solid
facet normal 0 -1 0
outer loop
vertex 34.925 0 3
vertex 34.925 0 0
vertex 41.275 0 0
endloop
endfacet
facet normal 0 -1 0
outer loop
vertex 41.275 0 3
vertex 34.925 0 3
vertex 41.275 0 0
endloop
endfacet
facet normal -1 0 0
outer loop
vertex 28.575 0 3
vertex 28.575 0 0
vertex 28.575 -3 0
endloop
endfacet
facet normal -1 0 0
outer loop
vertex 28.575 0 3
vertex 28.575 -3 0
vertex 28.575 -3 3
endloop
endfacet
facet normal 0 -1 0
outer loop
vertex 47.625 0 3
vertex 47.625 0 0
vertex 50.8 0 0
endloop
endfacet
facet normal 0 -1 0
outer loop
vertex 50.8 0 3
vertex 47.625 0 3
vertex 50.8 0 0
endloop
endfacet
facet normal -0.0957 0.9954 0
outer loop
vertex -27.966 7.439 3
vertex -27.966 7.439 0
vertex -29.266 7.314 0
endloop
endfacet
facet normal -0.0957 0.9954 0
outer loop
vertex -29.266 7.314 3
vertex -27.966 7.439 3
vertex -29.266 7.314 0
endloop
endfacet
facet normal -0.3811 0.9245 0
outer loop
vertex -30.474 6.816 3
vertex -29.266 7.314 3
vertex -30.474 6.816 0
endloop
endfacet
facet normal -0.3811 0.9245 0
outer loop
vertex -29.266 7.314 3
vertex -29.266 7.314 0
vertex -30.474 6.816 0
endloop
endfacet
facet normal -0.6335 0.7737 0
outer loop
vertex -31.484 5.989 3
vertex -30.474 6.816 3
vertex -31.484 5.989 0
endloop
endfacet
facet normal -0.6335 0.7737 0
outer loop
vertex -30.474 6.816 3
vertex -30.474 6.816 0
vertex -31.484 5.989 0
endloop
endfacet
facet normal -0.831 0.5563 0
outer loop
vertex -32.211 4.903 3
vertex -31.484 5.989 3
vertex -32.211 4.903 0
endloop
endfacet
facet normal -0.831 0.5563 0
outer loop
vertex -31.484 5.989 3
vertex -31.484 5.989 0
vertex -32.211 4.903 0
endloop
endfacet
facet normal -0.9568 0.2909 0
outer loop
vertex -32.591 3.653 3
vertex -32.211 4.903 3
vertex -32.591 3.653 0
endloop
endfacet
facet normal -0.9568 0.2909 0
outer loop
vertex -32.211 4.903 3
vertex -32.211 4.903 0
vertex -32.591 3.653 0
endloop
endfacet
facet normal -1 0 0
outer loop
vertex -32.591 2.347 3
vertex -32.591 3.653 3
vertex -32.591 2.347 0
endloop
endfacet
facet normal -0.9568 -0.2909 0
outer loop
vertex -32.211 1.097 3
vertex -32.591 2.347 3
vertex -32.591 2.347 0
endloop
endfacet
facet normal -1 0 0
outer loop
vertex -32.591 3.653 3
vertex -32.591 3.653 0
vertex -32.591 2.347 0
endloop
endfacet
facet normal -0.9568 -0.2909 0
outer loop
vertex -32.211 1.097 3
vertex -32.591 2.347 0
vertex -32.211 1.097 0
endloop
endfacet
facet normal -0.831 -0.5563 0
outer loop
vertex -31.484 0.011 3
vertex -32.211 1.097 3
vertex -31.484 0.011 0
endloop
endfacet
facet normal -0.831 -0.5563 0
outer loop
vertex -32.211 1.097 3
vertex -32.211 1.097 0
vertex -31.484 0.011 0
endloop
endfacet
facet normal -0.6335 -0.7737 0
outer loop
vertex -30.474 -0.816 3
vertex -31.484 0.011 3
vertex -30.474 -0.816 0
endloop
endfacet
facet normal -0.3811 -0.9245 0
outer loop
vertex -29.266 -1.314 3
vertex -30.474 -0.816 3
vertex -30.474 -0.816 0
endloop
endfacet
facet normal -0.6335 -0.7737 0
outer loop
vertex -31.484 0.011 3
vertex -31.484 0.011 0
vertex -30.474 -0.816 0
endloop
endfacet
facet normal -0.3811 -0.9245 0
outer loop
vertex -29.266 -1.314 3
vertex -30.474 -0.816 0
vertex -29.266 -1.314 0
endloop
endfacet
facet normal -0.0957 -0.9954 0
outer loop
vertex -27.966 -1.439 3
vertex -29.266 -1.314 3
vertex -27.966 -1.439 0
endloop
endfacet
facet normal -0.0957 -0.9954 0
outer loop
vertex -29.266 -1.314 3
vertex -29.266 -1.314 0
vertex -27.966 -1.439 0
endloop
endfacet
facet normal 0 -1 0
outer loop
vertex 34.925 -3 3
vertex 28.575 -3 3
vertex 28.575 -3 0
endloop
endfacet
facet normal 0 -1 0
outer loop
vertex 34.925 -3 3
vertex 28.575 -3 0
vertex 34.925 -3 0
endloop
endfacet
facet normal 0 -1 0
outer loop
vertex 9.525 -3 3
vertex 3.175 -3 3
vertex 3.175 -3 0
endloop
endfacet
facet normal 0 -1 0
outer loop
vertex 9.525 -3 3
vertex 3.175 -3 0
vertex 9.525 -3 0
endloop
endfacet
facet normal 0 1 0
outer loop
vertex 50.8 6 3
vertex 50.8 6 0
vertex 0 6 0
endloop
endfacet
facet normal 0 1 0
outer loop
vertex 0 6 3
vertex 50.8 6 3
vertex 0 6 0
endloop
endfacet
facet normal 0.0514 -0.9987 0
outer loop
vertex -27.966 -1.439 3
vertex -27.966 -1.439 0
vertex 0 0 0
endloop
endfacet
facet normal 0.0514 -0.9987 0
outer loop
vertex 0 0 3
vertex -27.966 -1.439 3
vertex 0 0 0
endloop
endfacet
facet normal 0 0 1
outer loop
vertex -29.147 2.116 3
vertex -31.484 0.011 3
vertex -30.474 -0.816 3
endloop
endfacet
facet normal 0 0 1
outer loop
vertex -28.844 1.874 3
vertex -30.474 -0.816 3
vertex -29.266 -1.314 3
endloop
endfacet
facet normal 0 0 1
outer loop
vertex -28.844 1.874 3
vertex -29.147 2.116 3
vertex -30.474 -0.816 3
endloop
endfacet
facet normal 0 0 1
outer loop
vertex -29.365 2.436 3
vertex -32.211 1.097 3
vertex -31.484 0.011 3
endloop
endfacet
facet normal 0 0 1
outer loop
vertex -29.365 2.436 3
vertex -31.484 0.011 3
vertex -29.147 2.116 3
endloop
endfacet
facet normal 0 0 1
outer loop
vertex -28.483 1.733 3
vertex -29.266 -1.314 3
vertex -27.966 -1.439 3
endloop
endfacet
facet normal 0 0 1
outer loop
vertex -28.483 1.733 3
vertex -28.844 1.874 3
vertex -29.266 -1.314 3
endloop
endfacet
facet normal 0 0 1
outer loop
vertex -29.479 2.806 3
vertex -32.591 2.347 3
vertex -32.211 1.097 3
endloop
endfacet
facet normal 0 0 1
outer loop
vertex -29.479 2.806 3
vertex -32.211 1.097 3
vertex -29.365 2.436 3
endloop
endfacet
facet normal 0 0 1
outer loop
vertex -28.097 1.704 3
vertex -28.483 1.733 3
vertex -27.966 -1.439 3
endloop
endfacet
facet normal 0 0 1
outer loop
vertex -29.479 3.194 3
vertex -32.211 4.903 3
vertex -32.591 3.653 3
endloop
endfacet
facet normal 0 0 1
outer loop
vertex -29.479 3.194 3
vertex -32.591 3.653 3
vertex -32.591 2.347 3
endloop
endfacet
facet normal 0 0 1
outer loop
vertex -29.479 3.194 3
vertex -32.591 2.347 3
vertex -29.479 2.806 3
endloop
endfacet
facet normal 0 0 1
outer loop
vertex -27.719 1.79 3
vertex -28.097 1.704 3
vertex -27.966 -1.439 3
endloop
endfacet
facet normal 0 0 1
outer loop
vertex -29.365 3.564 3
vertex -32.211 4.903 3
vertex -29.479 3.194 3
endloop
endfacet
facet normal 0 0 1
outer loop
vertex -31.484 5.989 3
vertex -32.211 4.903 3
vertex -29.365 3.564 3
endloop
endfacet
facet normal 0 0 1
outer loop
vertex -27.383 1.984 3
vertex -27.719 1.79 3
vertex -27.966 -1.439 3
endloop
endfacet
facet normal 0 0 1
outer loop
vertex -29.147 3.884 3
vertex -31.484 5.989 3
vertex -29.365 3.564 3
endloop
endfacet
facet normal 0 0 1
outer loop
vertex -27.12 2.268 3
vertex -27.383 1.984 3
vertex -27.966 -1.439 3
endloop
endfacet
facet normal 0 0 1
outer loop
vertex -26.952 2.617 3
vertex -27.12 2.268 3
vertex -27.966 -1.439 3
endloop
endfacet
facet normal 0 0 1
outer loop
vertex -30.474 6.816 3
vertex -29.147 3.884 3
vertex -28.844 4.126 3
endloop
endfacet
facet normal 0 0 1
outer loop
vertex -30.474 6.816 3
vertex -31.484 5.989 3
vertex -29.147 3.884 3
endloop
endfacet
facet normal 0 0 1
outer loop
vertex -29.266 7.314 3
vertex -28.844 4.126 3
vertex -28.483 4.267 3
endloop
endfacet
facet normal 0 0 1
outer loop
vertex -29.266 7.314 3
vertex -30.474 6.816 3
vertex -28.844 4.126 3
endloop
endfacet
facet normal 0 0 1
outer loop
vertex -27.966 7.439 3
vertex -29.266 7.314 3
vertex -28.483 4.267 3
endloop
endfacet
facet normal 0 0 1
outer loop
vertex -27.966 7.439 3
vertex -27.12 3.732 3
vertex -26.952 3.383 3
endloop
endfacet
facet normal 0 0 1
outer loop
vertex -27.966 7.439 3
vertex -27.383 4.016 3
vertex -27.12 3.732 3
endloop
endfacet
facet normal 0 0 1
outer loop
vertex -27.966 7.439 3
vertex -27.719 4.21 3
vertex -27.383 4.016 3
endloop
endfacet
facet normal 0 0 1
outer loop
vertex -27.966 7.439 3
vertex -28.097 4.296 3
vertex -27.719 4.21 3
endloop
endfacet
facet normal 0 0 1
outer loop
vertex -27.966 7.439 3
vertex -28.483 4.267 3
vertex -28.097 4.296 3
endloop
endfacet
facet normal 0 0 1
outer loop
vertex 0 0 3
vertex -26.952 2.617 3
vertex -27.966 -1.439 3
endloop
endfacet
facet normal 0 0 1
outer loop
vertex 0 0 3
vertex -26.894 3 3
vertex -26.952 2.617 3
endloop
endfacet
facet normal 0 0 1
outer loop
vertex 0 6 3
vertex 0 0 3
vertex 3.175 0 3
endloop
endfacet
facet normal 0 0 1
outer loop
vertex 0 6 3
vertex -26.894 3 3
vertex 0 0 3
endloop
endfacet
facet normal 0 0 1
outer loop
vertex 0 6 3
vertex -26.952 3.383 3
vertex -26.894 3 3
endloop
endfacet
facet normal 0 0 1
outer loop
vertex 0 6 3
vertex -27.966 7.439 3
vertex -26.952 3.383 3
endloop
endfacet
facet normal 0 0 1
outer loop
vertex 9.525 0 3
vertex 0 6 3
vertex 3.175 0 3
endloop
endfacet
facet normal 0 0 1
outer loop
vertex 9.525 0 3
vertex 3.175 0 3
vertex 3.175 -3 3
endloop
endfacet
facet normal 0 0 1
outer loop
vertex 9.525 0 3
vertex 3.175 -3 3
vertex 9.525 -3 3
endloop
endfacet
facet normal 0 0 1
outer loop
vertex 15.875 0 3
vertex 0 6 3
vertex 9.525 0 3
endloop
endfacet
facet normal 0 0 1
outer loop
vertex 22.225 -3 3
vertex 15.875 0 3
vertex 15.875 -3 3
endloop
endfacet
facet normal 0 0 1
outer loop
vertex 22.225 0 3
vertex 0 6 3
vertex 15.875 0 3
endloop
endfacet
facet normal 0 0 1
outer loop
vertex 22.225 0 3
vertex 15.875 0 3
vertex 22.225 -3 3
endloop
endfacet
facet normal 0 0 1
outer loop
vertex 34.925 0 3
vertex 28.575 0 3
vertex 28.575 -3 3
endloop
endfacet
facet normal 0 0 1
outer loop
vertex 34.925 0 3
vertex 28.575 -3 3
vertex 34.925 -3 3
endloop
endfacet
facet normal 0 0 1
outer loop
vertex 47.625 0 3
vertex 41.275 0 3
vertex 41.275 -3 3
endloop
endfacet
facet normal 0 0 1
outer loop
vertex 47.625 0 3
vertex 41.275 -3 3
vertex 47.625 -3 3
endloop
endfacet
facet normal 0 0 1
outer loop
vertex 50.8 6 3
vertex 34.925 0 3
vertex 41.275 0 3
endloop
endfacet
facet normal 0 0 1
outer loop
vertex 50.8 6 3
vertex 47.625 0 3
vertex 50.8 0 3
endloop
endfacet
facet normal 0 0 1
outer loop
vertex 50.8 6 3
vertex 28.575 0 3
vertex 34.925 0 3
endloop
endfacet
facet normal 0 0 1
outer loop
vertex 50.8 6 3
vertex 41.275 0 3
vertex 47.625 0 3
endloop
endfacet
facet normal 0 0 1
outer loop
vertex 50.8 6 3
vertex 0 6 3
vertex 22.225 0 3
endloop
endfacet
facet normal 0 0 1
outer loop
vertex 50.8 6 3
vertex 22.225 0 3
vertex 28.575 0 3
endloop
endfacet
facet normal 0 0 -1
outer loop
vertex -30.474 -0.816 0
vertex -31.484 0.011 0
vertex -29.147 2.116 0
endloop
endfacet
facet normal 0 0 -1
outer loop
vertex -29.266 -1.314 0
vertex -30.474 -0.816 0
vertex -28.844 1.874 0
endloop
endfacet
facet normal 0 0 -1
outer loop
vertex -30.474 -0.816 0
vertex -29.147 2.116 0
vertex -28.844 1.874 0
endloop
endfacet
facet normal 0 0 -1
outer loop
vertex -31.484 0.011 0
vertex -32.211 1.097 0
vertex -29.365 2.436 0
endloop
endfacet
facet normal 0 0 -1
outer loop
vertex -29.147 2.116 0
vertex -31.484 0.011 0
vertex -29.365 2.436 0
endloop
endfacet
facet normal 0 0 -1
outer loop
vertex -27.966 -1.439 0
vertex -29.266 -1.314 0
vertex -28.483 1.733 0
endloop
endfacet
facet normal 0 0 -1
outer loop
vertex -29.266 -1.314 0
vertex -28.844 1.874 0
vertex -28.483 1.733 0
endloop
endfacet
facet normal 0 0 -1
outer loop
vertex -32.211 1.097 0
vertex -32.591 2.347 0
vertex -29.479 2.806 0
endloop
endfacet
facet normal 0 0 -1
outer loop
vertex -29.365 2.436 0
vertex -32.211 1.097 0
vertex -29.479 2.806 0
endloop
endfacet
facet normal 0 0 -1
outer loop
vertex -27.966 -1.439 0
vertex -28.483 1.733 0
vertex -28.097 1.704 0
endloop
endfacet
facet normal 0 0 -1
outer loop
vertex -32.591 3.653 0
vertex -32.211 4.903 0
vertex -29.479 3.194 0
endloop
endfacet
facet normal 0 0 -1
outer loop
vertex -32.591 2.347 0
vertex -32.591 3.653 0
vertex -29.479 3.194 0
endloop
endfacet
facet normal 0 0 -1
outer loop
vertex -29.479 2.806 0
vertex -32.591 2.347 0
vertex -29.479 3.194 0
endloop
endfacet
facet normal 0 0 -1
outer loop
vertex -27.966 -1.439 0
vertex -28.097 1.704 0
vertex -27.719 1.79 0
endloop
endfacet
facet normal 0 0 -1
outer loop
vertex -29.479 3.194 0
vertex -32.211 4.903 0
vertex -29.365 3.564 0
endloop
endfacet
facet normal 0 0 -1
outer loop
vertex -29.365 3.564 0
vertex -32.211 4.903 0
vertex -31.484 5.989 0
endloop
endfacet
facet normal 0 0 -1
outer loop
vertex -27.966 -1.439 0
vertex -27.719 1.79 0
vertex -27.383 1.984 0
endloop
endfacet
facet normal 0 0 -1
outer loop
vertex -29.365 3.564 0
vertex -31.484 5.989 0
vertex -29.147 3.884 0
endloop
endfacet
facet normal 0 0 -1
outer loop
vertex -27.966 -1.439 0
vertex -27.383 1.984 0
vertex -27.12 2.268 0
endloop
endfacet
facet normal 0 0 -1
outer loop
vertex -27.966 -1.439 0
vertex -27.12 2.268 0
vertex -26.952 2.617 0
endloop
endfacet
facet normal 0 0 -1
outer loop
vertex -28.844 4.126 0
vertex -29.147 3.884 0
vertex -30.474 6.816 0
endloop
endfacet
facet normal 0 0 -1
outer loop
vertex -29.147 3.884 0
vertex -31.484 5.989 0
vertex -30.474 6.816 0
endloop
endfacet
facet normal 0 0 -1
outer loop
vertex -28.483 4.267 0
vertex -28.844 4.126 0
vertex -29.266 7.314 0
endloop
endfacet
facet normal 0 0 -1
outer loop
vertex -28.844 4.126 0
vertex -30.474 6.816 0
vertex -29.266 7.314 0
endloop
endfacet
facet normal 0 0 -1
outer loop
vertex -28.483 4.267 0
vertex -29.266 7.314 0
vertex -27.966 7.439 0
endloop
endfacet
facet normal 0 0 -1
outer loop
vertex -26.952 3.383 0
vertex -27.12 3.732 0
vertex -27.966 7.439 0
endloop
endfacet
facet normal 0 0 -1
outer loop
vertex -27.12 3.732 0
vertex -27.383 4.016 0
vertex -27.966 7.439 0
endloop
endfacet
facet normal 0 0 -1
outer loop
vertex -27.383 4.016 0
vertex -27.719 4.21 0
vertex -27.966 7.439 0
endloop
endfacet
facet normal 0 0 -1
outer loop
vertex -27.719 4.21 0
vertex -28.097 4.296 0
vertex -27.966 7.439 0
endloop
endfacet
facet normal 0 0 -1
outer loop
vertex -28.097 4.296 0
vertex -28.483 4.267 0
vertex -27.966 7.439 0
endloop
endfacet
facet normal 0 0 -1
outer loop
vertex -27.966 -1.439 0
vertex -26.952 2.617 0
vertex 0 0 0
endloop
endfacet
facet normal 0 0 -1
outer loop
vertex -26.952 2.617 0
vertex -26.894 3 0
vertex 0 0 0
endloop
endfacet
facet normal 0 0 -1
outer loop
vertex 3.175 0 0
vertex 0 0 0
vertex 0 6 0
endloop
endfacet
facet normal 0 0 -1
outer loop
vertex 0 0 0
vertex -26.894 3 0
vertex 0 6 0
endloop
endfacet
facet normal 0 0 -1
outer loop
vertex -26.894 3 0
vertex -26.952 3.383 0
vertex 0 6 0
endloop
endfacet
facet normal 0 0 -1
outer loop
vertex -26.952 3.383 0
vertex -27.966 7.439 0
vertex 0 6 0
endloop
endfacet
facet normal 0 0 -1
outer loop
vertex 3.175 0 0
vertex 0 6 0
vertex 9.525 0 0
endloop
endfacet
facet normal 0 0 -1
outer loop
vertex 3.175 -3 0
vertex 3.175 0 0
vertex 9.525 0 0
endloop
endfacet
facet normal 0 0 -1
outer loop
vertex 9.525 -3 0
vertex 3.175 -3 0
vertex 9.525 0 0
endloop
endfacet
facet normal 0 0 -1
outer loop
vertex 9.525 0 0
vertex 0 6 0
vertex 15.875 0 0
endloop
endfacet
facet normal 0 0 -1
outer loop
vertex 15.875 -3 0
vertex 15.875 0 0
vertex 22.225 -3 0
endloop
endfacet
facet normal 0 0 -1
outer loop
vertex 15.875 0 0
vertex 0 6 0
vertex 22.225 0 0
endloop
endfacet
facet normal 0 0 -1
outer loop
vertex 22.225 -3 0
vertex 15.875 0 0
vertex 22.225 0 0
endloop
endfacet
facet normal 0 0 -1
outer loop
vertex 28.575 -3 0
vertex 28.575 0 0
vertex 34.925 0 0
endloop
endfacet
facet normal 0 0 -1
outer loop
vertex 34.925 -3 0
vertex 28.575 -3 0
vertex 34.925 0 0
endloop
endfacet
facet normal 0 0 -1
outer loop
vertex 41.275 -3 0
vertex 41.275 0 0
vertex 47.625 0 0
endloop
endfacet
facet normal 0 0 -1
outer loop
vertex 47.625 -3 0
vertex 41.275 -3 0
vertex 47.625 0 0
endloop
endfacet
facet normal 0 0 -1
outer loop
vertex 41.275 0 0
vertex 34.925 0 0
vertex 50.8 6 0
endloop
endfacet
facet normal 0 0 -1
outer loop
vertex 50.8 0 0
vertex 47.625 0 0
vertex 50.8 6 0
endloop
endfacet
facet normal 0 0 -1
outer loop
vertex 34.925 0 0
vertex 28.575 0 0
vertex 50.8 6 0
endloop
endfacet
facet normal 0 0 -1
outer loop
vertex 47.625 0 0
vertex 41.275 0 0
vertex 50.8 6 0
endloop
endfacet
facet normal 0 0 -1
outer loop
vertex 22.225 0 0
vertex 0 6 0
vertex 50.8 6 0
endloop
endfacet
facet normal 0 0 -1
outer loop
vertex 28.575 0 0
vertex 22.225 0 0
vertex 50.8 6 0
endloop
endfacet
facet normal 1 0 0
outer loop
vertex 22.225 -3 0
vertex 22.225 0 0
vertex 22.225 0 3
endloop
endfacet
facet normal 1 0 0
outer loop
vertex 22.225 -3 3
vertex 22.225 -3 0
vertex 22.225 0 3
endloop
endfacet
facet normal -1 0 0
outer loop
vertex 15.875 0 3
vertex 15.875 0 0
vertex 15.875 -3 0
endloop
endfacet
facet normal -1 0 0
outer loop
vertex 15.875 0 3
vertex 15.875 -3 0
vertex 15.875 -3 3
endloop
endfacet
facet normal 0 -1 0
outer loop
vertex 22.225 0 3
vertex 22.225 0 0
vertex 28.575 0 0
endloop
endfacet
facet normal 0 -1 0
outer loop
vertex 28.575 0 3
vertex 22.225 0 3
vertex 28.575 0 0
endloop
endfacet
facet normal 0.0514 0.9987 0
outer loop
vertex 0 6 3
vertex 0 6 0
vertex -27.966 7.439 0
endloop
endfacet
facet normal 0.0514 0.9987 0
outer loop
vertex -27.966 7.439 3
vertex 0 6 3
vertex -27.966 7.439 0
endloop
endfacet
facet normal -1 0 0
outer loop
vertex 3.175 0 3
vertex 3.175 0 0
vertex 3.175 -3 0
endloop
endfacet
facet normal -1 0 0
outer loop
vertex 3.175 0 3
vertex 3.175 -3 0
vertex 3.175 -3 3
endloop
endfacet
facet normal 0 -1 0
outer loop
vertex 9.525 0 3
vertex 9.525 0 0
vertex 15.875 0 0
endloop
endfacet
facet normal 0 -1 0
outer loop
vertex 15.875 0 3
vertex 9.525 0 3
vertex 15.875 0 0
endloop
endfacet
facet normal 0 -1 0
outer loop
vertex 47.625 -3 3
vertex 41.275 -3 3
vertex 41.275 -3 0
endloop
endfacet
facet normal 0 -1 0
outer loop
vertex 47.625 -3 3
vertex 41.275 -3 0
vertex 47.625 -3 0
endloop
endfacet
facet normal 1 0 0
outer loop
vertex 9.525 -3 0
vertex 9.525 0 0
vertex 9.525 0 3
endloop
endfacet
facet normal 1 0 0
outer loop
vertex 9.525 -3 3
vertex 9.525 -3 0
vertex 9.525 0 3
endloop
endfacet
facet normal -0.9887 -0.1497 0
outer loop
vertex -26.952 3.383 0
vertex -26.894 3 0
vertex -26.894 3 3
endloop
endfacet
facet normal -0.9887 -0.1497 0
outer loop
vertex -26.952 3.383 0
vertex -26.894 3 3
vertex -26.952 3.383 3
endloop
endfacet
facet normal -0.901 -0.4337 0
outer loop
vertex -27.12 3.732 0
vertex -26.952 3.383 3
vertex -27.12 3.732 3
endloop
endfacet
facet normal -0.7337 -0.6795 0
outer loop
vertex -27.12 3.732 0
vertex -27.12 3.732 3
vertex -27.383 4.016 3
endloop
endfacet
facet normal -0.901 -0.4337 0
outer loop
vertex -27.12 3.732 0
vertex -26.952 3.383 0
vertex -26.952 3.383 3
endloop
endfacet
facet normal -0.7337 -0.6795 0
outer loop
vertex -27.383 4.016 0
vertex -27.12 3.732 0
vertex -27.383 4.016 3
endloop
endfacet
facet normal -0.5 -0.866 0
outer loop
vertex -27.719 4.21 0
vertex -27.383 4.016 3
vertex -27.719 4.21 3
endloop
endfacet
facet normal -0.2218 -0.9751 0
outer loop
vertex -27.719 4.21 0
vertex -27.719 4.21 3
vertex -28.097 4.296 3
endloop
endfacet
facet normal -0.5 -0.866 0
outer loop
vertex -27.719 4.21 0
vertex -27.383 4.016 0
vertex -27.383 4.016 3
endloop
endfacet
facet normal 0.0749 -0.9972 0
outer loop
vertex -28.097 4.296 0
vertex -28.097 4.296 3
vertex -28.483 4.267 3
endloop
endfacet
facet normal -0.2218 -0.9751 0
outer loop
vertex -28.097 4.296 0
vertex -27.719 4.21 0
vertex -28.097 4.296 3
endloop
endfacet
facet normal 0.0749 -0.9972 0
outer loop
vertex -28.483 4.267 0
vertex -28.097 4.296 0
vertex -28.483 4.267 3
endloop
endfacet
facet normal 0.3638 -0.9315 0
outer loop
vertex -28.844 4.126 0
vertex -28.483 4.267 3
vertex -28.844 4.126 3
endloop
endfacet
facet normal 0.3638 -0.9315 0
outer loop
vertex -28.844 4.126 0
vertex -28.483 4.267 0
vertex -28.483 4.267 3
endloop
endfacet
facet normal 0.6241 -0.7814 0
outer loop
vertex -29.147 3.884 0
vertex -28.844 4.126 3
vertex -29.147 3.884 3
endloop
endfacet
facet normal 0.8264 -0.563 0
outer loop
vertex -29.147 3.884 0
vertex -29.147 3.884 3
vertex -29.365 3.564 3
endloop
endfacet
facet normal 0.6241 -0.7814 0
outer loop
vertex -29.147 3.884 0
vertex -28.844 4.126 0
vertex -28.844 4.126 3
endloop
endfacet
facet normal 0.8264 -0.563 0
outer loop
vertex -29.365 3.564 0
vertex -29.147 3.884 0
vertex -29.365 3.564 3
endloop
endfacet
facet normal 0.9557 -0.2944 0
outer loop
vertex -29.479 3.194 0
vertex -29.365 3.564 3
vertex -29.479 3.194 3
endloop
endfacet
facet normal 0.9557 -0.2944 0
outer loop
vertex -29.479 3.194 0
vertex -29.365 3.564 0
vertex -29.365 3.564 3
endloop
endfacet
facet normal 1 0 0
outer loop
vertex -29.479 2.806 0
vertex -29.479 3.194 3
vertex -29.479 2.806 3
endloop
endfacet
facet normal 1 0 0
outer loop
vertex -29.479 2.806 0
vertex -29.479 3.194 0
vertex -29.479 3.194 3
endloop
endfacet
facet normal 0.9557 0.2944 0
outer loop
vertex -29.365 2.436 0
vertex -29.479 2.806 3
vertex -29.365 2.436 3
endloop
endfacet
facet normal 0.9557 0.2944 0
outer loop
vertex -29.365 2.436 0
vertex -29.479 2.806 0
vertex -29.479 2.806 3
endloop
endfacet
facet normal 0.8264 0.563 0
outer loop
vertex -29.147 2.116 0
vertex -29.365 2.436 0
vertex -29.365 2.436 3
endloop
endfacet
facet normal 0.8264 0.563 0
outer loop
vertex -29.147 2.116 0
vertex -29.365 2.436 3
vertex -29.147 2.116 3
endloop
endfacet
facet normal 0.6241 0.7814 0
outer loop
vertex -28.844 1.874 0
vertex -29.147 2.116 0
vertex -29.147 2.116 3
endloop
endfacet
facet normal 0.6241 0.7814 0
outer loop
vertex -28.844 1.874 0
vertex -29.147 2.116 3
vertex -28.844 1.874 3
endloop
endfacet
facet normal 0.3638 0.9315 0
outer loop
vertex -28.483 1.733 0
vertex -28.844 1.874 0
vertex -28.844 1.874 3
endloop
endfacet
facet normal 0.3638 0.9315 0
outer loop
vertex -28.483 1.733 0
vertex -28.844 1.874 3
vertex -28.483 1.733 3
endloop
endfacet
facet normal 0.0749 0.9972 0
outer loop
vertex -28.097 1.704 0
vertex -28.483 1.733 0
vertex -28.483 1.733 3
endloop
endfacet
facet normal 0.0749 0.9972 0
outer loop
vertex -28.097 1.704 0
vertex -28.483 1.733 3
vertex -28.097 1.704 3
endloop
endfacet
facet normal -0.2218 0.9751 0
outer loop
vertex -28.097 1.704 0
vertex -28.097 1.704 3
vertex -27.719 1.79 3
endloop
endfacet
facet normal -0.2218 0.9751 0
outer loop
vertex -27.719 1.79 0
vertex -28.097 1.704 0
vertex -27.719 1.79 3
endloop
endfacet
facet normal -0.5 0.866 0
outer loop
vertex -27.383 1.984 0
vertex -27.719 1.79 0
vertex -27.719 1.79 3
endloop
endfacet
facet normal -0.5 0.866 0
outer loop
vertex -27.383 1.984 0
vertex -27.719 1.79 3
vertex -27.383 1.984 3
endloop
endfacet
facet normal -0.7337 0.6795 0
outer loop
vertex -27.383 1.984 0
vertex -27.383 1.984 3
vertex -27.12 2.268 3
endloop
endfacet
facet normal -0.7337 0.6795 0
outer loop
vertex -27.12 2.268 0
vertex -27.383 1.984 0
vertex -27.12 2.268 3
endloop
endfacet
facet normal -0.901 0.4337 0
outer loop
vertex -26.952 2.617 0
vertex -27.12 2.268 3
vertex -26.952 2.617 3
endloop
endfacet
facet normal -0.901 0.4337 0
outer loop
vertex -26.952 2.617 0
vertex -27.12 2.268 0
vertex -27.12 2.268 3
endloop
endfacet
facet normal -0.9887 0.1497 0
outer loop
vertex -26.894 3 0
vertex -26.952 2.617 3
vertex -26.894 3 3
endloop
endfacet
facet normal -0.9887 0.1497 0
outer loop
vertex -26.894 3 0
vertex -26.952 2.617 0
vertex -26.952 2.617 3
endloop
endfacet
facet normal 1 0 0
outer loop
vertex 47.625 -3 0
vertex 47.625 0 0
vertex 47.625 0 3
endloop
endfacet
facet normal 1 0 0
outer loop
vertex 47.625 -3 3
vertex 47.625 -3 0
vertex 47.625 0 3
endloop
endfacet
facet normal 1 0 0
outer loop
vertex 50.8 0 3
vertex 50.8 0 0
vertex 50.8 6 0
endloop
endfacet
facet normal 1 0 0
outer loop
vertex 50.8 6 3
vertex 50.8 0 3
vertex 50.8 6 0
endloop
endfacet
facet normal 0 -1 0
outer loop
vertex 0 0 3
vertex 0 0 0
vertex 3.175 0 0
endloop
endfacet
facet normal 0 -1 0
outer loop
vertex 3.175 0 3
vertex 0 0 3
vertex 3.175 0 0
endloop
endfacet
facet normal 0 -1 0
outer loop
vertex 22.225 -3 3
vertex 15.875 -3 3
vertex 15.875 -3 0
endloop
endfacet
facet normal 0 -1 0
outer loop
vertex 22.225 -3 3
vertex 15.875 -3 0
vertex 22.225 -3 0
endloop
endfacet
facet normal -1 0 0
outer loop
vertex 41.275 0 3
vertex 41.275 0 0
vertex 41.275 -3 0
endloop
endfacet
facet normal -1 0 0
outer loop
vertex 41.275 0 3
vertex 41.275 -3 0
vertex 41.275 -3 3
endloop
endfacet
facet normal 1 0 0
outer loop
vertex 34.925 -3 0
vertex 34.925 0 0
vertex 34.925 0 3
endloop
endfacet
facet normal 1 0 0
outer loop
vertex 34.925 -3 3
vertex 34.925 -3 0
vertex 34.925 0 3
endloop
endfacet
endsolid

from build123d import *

# Parameters (mm, degrees)
SKETCH2_R           = 1.3
BOSS_EXTRUDE1_DEPTH = 3
SKETCH3_W           = 6.35
SKETCH3_H           = 3
BOSS_EXTRUDE2_DEPTH = 3
LPATTERN1_COUNT     = 4
LPATTERN1_PITCH     = 12.7


with BuildPart() as part:
    # Sketch2 → Boss-Extrude1 (new body)
    with BuildSketch(Plane.XY):
        with BuildLine():
            Line((0, 6), (-27.965559662, 7.439126041))
            ThreePointArc((-27.965559662, 7.439126041), (-32.639, 3), (-27.965559662, -1.439126041))
            Line((-27.965559662, -1.439126041), (0, 0))
            Line((0, 0), (50.8, 0))
            Line((50.8, 0), (50.8, 6))
            Line((50.8, 6), (0, 6))
        make_face()
        with Locations((-28.194, 3)):
            Circle(SKETCH2_R, mode=Mode.SUBTRACT)
    extrude(amount=BOSS_EXTRUDE1_DEPTH)

    # Sketch3 → Boss-Extrude2 (add)
    with BuildSketch(Plane.XZ):
        with Locations((6.35, 1.5)):
            Rectangle(SKETCH3_W, SKETCH3_H)
    boss_extrude2 = extrude(amount=BOSS_EXTRUDE2_DEPTH)

    # LPattern1: Boss-Extrude2 ×4
    with Locations(*[(i * LPATTERN1_PITCH, 0, 0) for i in range(1, LPATTERN1_COUNT)]):
        add(boss_extrude2)


solid = part.part
